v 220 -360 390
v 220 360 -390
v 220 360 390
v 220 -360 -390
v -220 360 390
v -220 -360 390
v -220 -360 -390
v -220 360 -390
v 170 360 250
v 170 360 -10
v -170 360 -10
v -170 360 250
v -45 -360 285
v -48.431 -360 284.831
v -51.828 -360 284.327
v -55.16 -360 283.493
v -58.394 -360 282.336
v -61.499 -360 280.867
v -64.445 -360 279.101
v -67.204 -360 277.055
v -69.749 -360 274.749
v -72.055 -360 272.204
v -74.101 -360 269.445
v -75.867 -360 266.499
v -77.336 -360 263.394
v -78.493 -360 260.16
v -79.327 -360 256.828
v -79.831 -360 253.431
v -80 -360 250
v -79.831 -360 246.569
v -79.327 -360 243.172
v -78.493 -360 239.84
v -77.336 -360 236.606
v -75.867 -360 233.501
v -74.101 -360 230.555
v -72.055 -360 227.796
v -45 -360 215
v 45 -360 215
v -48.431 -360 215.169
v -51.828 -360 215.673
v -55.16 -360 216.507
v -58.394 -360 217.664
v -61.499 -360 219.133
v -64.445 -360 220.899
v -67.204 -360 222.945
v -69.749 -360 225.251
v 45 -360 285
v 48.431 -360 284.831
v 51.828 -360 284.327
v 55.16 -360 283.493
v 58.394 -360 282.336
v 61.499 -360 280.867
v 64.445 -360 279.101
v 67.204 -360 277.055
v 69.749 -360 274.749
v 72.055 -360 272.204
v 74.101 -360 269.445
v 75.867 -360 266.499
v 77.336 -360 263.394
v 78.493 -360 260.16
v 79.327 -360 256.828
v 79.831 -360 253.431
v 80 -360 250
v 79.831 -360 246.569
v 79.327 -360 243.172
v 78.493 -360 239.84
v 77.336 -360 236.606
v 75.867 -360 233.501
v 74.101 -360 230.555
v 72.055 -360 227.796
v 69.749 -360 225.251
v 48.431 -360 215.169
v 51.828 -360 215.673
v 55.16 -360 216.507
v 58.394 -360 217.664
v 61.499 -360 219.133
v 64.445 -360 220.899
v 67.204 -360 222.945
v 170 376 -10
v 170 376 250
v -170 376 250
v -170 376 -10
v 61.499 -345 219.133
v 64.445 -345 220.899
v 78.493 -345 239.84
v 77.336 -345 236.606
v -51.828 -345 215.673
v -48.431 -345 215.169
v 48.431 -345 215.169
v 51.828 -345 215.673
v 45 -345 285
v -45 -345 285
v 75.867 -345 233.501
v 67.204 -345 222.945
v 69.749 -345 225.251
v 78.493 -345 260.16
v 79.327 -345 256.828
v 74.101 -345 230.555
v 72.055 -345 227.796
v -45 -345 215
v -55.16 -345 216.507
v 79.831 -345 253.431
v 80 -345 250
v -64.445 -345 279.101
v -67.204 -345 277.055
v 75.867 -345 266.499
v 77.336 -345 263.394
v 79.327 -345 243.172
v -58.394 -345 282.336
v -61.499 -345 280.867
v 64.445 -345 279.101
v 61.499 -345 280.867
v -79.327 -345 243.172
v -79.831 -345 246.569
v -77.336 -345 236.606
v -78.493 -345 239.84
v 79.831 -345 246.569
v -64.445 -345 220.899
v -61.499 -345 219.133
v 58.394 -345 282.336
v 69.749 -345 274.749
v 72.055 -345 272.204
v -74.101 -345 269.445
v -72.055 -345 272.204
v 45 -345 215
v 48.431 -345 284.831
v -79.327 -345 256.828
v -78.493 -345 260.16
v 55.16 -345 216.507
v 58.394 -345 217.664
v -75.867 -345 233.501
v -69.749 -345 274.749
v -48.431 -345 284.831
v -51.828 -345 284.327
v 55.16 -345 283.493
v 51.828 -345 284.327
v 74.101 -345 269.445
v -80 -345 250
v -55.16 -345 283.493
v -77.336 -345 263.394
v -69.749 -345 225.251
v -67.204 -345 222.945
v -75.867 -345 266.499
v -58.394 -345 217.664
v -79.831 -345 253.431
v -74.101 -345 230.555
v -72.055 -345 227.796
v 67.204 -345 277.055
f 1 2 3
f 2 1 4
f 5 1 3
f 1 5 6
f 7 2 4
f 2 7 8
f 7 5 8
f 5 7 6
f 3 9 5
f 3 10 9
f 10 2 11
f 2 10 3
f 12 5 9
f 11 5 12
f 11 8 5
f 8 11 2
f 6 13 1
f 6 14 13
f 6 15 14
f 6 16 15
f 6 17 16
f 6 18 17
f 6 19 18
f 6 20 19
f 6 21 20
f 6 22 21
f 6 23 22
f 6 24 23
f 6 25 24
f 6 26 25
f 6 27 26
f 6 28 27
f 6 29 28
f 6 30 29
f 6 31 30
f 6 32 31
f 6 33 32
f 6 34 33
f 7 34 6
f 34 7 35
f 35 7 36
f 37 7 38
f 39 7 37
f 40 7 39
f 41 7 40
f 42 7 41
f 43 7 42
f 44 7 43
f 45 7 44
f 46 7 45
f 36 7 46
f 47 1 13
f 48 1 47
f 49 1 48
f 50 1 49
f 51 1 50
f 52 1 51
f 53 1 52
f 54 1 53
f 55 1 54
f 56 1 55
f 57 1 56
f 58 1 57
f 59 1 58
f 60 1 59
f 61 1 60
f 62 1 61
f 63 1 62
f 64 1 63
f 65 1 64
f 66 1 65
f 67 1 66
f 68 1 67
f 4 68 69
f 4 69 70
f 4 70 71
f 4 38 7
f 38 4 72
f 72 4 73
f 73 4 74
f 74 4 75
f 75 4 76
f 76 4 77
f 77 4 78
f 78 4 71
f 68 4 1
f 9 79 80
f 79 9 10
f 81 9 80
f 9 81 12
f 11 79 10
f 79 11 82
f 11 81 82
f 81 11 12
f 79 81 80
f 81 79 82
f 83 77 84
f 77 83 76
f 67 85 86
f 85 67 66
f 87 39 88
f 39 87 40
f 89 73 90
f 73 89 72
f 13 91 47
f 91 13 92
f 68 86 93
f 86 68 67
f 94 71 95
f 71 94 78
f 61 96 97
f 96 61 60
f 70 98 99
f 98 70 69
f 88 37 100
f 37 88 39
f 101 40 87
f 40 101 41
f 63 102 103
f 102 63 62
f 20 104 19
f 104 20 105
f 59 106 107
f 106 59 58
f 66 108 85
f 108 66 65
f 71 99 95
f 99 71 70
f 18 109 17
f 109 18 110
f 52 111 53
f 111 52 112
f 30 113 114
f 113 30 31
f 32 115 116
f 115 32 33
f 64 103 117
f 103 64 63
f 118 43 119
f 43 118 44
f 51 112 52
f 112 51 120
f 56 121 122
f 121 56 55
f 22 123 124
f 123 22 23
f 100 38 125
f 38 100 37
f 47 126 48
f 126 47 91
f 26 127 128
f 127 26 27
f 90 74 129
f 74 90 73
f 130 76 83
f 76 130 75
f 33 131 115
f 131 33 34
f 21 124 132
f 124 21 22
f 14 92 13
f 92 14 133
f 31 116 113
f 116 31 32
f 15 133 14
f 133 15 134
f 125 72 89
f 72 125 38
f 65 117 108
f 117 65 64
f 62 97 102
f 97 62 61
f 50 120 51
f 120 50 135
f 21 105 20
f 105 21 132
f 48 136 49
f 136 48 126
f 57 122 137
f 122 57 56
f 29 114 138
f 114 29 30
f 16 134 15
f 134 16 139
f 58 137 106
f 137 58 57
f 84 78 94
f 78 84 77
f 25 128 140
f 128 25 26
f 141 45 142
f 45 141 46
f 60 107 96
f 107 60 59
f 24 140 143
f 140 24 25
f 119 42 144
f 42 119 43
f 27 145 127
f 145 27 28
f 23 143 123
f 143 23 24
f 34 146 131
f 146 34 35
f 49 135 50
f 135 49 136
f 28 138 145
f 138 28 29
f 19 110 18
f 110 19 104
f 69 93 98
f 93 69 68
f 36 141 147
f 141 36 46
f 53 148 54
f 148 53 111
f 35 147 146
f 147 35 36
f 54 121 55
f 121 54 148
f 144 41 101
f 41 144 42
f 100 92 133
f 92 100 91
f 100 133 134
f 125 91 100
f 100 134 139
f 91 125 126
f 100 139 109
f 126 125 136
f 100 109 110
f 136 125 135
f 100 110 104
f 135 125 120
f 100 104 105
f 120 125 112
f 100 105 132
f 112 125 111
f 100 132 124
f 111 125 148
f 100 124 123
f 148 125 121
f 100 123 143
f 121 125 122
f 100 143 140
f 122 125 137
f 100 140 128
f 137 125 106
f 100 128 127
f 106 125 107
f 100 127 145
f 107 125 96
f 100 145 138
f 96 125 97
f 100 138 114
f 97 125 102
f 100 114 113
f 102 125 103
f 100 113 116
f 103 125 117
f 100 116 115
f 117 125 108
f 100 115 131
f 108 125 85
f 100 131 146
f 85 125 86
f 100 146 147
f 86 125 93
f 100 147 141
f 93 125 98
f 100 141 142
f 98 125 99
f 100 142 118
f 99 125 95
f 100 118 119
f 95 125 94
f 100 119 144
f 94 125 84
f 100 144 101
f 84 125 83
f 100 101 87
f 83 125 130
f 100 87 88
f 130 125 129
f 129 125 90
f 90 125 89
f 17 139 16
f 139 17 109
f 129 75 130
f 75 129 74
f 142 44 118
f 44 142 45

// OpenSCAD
// ============================================================================
// Atom Lithography Machine — Parametric OpenSCAD Module (S7.SAFETY-04)
// ============================================================================
// part_id           : S7.SAFETY-04
// parent_bom_id     : S7.SAFETY
// subsystem         : S7
// part_name         : 15 kVA / 10 kWh Online Cift-Donusumlu LFP UPS (0 ms Gecis) & Kademeli Yuk-Atma PDU (Exp150, 145.0 kg)
// material          : LFP
// temp_stage        : 300 K (tesis guc bolmesi)
// vacuum_grade      : Atmosfer
// tolerance         : 0 ms gecis, >=30 dk tam
// computed_mass_kg  : 145.00000
// envelope_mm       : 440.000 x 736.200 x 780.000
// design_maturity   : M0_M1_DETAILED_CAD_DESIGN_ONLY
// no_lab_measurement: true
// iec61508_certified: false
// semi_s2_certified : false
// Units: millimeters (mm)
// ============================================================================

$fn = 64;

// Nominal bounding envelope parameters (mm)
bbox_x = 440.0000;
bbox_y = 736.2000;
bbox_z = 780.0000;

// Part-specific parametric dimensions
ups_w_mm = 440.0;
ups_d_mm = 720.0;
ups_h_mm = 780.0;
kva_rating = 15.0;
lfp_kwh = 10.0;

// Interface / port parameters (mm)

module part_S7_SAFETY_04() {
  difference() {
    union() {
      // 15 kVA / 10 kWh Online LFP UPS floor tower
      cube([440.000, 720.000, 780.000], center=true);
      // Tier-1 / Tier-2 load-shed breaker panel
      translate([0.000, 368.000, 120.000]) cube([340.000, 16.000, 260.000], center=true);
    }
    // Front LCD telemetry bezel
    translate([0.000, -355.000, 250.000]) rotate([90.000, 0.000, 0.000]) {
      hull() {
        translate([-45.000, 0, 0]) cylinder(d=70.000, h=20.000, center=true);
        translate([45.000, 0, 0]) cylinder(d=70.000, h=20.000, center=true);
      }
    }
  }
}

// World assembly mounting transform (global machine frame, mm / deg):
// translate([2650.000, 150.000, 390.000]) rotate([0.000, 0.000, 0.000]) part_S7_SAFETY_04();

part_S7_SAFETY_04();
